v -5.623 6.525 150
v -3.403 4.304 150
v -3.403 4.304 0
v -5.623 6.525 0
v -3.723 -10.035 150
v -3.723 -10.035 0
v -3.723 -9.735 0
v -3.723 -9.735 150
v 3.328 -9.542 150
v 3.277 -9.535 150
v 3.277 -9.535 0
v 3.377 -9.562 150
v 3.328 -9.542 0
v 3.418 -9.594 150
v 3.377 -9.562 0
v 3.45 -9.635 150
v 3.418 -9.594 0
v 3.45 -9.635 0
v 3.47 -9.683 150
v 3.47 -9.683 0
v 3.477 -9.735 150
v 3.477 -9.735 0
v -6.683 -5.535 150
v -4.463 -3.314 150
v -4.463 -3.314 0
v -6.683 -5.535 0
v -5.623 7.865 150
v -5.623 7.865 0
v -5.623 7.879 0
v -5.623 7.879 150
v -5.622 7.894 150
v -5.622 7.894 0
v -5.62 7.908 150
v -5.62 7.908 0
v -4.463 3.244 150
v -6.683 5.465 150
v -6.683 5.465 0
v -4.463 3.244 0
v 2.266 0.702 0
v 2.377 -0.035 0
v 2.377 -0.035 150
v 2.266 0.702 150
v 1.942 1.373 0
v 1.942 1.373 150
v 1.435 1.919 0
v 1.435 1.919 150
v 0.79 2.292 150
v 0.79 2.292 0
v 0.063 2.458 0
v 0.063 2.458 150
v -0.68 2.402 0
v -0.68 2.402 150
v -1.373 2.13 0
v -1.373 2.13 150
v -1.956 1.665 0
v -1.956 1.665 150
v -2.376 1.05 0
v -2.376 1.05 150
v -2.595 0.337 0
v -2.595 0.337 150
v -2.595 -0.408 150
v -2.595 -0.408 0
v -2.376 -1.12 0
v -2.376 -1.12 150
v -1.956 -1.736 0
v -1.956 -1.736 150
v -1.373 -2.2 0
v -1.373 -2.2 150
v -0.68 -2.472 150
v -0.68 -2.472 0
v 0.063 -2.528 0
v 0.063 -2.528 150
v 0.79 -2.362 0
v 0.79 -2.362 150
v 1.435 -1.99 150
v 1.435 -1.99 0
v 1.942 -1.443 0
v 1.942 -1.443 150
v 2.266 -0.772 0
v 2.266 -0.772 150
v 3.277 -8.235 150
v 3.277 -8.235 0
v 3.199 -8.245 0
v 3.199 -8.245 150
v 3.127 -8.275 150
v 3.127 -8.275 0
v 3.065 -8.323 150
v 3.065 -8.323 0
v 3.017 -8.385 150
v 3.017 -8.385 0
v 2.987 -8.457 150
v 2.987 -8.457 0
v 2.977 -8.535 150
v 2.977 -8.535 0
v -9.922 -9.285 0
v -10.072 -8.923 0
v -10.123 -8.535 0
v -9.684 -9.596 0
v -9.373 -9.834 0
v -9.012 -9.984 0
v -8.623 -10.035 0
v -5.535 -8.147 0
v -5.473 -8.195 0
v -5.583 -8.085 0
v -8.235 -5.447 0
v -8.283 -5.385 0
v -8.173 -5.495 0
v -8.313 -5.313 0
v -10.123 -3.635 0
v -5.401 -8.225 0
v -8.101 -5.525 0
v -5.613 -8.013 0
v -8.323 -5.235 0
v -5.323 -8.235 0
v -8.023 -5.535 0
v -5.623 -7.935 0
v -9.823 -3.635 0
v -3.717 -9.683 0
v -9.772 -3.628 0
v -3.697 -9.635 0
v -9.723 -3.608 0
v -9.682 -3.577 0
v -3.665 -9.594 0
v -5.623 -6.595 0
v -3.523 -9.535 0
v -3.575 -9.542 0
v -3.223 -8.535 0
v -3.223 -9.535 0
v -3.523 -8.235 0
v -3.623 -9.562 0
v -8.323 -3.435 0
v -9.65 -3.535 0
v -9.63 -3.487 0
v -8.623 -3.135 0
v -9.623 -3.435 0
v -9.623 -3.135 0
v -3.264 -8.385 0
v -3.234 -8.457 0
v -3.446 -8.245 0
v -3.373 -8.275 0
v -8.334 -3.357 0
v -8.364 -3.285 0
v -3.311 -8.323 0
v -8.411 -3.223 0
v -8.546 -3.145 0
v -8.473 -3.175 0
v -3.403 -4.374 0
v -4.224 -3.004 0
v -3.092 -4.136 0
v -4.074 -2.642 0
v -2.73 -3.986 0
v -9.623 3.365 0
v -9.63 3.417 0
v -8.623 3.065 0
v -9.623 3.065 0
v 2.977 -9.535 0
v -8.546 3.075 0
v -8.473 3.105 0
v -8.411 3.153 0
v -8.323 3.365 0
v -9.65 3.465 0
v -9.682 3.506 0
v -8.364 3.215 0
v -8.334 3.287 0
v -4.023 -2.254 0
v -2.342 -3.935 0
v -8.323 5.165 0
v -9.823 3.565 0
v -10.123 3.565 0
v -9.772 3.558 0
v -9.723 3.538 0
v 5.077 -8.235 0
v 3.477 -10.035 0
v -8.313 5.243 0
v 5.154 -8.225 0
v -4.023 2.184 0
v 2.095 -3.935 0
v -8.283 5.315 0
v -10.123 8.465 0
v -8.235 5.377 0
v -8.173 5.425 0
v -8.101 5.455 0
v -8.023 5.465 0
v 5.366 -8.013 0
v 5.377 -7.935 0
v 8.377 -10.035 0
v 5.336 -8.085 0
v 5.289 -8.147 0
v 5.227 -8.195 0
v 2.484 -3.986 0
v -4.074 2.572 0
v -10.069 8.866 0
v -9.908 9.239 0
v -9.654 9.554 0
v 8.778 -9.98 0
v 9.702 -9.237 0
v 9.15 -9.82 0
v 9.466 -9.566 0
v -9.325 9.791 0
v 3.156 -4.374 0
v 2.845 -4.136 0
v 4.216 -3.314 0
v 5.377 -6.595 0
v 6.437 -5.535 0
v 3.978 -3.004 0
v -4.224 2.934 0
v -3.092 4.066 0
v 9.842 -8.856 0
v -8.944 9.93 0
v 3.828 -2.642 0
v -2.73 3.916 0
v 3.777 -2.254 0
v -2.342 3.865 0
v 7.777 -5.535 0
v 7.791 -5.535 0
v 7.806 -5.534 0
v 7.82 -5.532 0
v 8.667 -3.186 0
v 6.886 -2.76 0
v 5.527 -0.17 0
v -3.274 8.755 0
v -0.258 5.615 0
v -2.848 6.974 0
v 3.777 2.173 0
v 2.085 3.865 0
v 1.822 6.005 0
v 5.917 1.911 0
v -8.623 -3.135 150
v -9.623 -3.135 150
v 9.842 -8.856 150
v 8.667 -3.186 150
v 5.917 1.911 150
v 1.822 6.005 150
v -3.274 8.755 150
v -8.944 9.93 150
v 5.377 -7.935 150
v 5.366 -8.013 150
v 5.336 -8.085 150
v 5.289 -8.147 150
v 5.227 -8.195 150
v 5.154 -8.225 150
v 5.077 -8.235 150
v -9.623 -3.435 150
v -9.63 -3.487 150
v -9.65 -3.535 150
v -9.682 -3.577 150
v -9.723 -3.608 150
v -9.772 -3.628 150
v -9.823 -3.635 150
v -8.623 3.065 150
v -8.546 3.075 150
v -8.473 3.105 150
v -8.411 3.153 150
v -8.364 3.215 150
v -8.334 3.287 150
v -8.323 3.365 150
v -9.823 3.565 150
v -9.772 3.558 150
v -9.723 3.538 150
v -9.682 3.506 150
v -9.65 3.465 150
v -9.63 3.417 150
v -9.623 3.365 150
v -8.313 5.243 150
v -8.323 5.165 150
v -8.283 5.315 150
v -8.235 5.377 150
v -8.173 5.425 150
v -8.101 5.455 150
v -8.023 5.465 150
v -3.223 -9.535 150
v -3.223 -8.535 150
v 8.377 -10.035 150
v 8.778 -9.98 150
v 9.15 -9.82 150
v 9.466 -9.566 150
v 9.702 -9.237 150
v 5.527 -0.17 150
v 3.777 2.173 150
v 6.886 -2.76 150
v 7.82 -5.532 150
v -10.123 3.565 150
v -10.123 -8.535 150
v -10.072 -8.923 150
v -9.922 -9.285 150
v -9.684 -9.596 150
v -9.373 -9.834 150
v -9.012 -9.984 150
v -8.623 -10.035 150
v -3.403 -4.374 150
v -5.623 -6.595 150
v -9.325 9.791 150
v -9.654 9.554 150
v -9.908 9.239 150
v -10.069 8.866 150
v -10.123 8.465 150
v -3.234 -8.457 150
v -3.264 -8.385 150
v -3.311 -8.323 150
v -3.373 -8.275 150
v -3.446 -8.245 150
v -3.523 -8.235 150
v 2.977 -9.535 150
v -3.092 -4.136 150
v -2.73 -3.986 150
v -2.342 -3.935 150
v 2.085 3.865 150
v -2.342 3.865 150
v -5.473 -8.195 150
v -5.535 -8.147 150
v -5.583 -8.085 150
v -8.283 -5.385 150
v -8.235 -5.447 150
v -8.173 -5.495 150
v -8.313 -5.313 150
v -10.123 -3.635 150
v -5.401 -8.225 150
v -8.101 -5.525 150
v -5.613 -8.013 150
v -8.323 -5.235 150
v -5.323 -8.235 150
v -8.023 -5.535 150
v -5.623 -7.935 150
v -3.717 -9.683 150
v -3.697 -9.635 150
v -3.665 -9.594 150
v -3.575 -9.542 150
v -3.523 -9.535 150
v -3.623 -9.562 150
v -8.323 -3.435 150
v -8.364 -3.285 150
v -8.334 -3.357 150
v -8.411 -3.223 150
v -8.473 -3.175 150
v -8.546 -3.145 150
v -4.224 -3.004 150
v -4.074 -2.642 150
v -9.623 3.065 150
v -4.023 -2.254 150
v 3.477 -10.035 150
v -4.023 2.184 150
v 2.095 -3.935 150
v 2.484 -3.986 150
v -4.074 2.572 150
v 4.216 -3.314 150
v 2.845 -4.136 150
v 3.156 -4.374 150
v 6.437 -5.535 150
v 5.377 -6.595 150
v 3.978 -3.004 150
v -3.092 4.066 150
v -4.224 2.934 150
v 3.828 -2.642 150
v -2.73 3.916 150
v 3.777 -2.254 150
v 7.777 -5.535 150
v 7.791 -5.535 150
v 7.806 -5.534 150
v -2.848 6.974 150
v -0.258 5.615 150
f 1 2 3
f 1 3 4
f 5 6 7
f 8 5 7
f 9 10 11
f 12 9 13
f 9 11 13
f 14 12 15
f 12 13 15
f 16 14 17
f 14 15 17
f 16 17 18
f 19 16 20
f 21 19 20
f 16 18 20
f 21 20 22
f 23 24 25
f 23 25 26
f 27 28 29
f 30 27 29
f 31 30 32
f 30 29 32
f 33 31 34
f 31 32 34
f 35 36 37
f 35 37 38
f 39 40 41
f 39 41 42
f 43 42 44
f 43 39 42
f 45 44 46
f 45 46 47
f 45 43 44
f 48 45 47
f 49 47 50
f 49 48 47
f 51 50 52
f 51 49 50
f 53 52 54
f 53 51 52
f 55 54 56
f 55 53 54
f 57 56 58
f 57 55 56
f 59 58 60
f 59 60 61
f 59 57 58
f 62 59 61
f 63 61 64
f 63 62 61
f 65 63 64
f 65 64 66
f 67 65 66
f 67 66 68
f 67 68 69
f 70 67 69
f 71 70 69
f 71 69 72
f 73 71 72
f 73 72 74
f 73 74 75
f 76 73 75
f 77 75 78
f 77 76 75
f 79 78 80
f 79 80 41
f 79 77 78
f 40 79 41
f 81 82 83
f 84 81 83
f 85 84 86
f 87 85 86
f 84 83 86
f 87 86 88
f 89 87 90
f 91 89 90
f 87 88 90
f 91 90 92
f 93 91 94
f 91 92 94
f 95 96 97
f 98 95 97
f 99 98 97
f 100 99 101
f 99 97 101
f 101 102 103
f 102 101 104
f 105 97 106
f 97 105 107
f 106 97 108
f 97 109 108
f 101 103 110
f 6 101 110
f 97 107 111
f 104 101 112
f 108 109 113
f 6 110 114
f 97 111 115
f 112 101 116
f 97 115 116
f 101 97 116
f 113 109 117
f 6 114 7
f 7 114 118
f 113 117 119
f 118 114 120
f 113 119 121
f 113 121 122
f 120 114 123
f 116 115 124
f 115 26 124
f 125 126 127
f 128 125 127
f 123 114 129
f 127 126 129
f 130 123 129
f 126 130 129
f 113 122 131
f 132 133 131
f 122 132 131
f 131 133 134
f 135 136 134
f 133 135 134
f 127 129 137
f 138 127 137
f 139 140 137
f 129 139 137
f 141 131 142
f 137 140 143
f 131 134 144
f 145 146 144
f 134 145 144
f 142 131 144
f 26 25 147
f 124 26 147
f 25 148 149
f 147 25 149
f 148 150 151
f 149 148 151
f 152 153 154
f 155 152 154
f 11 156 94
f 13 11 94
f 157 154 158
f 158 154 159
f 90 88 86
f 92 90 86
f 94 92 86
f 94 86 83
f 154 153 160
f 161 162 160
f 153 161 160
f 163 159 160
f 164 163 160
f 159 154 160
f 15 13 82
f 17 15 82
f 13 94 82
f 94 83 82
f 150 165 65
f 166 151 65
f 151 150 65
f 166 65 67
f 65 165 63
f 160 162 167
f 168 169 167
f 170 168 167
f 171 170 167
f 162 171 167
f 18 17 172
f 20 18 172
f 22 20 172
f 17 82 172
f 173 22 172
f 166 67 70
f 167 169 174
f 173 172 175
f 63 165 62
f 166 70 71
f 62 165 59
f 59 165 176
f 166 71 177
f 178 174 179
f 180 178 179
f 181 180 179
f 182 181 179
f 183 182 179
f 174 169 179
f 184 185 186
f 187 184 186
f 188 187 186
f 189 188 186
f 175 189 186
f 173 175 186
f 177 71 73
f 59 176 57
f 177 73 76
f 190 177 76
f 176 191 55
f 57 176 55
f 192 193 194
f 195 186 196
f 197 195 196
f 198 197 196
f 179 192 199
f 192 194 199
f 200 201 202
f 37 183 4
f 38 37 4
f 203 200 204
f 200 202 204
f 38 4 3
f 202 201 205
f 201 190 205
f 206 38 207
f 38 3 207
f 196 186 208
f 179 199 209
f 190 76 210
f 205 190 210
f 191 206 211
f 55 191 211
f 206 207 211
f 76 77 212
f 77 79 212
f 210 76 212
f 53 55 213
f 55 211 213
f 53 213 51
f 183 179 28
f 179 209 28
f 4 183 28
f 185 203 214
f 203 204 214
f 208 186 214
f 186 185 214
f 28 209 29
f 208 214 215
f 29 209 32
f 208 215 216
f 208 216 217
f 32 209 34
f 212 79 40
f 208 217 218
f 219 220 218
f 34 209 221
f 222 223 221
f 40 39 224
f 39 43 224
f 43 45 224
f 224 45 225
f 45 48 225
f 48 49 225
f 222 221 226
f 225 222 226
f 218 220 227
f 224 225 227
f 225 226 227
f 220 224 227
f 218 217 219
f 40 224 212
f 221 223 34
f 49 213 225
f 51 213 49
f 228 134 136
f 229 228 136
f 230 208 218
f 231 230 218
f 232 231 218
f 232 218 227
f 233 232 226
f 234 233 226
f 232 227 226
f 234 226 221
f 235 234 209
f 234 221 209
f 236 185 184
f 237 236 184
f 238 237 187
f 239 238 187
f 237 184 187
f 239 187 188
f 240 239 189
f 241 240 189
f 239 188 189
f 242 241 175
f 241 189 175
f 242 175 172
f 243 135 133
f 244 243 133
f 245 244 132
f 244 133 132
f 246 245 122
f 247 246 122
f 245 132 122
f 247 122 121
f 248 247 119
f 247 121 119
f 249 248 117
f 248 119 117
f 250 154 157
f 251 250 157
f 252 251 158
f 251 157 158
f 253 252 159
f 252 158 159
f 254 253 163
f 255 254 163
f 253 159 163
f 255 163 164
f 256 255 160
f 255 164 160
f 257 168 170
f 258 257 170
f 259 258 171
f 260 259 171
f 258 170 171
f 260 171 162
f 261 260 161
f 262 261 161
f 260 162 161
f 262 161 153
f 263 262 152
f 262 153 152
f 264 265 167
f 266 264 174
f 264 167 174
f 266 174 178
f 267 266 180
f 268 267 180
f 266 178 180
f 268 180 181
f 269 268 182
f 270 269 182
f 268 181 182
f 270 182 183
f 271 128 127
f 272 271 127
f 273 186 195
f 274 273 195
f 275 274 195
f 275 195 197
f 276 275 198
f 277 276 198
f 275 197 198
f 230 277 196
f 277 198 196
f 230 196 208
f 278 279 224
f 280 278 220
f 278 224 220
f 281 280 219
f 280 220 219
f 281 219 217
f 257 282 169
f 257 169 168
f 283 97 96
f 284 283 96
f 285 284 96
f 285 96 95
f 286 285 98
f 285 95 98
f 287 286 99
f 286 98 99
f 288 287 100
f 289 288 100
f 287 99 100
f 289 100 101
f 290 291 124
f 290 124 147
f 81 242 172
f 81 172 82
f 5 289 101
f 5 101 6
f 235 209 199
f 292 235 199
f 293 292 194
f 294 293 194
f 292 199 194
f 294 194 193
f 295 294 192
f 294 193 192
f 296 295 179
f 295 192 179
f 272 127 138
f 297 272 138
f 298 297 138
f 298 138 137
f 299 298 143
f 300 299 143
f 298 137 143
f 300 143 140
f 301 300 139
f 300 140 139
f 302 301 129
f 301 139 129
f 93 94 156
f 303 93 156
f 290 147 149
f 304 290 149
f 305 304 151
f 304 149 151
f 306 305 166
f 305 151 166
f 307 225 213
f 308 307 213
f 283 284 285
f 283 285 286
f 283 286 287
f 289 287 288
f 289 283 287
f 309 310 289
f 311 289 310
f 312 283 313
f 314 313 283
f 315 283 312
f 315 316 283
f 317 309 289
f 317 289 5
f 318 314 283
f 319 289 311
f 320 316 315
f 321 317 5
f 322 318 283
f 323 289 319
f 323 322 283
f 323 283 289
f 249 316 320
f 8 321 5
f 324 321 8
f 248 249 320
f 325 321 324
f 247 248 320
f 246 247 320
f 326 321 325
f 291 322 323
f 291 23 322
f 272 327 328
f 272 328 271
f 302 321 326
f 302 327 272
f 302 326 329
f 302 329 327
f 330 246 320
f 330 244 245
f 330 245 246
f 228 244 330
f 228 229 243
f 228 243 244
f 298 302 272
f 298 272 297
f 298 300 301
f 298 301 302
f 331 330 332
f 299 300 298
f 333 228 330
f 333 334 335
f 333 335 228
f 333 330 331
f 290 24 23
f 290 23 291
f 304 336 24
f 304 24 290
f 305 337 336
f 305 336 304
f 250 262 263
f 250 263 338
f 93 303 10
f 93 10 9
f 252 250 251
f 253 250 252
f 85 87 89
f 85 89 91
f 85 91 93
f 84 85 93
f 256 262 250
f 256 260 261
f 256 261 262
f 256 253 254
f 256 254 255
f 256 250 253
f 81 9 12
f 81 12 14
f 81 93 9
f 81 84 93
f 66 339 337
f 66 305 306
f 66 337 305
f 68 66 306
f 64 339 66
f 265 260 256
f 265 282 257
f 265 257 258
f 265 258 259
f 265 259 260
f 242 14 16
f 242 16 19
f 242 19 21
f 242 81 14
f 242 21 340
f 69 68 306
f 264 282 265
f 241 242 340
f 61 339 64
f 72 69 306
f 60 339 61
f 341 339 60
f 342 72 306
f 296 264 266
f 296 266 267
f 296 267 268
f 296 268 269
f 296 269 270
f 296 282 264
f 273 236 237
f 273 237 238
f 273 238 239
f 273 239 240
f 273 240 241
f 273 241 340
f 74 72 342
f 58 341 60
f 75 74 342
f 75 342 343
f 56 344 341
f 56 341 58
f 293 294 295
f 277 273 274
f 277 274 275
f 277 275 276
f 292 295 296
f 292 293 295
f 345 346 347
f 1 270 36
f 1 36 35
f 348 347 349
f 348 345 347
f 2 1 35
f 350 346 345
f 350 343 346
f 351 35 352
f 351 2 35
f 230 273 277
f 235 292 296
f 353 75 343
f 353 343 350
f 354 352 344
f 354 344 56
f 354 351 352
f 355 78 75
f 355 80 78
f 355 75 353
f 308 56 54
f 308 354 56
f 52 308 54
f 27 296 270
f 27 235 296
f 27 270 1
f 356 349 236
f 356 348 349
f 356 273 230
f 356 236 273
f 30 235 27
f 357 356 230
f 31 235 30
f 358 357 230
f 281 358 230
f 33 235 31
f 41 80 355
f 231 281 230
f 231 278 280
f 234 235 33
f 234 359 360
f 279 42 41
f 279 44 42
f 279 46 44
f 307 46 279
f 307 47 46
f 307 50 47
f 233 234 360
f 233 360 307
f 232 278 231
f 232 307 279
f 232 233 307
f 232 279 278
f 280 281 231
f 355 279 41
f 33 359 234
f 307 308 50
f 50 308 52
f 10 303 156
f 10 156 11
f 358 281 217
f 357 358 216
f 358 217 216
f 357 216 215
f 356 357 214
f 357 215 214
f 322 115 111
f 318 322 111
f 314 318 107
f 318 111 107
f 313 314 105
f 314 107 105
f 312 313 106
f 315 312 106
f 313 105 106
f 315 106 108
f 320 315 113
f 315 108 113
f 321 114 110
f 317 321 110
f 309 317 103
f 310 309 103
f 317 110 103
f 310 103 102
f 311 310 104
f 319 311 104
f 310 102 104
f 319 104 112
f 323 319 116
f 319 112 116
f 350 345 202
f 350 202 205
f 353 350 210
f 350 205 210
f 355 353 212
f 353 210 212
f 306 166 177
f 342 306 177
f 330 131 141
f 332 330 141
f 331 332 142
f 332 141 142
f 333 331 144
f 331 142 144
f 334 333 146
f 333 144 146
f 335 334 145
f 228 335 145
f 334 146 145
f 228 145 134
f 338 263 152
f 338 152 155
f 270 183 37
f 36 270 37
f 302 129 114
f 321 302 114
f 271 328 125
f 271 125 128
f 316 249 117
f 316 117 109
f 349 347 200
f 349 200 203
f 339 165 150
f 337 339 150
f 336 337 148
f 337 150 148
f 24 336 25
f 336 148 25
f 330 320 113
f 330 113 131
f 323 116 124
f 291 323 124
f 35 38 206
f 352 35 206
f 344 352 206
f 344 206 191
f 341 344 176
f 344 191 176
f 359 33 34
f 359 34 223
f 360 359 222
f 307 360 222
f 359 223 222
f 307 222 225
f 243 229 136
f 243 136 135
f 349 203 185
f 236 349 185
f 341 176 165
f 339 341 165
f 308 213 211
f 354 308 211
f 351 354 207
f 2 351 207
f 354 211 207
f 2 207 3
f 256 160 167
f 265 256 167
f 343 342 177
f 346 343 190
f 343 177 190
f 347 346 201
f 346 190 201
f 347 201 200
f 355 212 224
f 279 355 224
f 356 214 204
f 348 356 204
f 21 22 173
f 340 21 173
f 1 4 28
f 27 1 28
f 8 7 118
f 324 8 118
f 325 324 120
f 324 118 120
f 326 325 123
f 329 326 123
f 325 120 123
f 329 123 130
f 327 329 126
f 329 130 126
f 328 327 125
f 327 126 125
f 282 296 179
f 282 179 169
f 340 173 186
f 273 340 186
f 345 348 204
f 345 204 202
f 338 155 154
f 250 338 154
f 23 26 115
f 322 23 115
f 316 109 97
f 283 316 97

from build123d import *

# Parameters (mm, degrees)
SKETCH_1_R      = 2.5
EXTRUDE_1_DEPTH = 150


with BuildPart() as part:
    # 草图1 → 凸台-拉伸1 (new body)
    with BuildSketch(Plane.XY):
        with BuildLine():
            ThreePointArc((-8.944458369, 9.930115847), (-9.792033903, 9.405190523), (-10.123344197, 8.464890373))
            Line((-10.123344197, 8.464890373), (-10.123344197, 3.564890373))
            Line((-10.123344197, 3.564890373), (-9.823344197, 3.564890373))
            ThreePointArc((-9.823344197, 3.564890373), (-9.681922841, 3.50631173), (-9.623344197, 3.364890373))
            Line((-9.623344197, 3.364890373), (-9.623344197, 3.064890373))
            Line((-9.623344197, 3.064890373), (-8.623344197, 3.064890373))
            ThreePointArc((-8.623344197, 3.064890373), (-8.411212162, 3.152758339), (-8.323344197, 3.364890373))
            Line((-8.323344197, 3.364890373), (-8.323344197, 5.164890373))
            ThreePointArc((-8.323344197, 5.164890373), (-8.235476231, 5.377022408), (-8.023344197, 5.464890373))
            Line((-8.023344197, 5.464890373), (-6.683344197, 5.464890373))
            Line((-6.683344197, 5.464890373), (-4.462684025, 3.244230202))
            ThreePointArc((-4.462684025, 3.244230202), (-4.137524898, 2.757595178), (-4.023344197, 2.18357003))
            Line((-4.023344197, 2.18357003), (-4.023344197, -2.253789283))
            ThreePointArc((-4.023344197, -2.253789283), (-4.137524898, -2.827814432), (-4.462684025, -3.314449455))
            Line((-4.462684025, -3.314449455), (-6.683344197, -5.535109627))
            Line((-6.683344197, -5.535109627), (-8.023344197, -5.535109627))
            ThreePointArc((-8.023344197, -5.535109627), (-8.235476231, -5.447241661), (-8.323344197, -5.235109627))
            Line((-8.323344197, -5.235109627), (-8.323344197, -3.435109627))
            ThreePointArc((-8.323344197, -3.435109627), (-8.411212162, -3.222977592), (-8.623344197, -3.135109627))
            Line((-8.623344197, -3.135109627), (-9.623344197, -3.135109627))
            Line((-9.623344197, -3.135109627), (-9.623344197, -3.435109627))
            ThreePointArc((-9.623344197, -3.435109627), (-9.681922841, -3.576530983), (-9.823344197, -3.635109627))
            Line((-9.823344197, -3.635109627), (-10.123344197, -3.635109627))
            Line((-10.123344197, -3.635109627), (-10.123344197, -8.535109627))
            ThreePointArc((-10.123344197, -8.535109627), (-9.684004369, -9.595769798), (-8.623344197, -10.035109627))
            Line((-8.623344197, -10.035109627), (-3.723344197, -10.035109627))
            Line((-3.723344197, -10.035109627), (-3.723344197, -9.735109627))
            ThreePointArc((-3.723344197, -9.735109627), (-3.664765553, -9.59368827), (-3.523344197, -9.535109627))
            Line((-3.523344197, -9.535109627), (-3.223344197, -9.535109627))
            Line((-3.223344197, -9.535109627), (-3.223344197, -8.535109627))
            ThreePointArc((-3.223344197, -8.535109627), (-3.311212162, -8.322977592), (-3.523344197, -8.235109627))
            Line((-3.523344197, -8.235109627), (-5.323344197, -8.235109627))
            ThreePointArc((-5.323344197, -8.235109627), (-5.535476231, -8.147241661), (-5.623344197, -7.935109627))
            Line((-5.623344197, -7.935109627), (-5.623344197, -6.595109627))
            Line((-5.623344197, -6.595109627), (-3.402684025, -4.374449455))
            ThreePointArc((-3.402684025, -4.374449455), (-2.916049002, -4.049290328), (-2.342023853, -3.935109627))
            Line((-2.342023853, -3.935109627), (2.09533546, -3.935109627))
            ThreePointArc((2.09533546, -3.935109627), (2.669360608, -4.049290328), (3.155995631, -4.374449455))
            Line((3.155995631, -4.374449455), (5.376655803, -6.595109627))
            Line((5.376655803, -6.595109627), (5.376655803, -7.935109627))
            ThreePointArc((5.376655803, -7.935109627), (5.288787838, -8.147241661), (5.076655803, -8.235109627))
            Line((5.076655803, -8.235109627), (3.276655803, -8.235109627))
            ThreePointArc((3.276655803, -8.235109627), (3.064523769, -8.322977592), (2.976655803, -8.535109627))
            Line((2.976655803, -8.535109627), (2.976655803, -9.535109627))
            Line((2.976655803, -9.535109627), (3.276655803, -9.535109627))
            ThreePointArc((3.276655803, -9.535109627), (3.418077159, -9.59368827), (3.476655803, -9.735109627))
            Line((3.476655803, -9.735109627), (3.476655803, -10.035109627))
            Line((3.476655803, -10.035109627), (8.376655803, -10.035109627))
            ThreePointArc((8.376655803, -10.035109627), (9.316955952, -9.703799333), (9.841881277, -8.856223799))
            ThreePointArc((9.841881277, -8.856223799), (4.018791427, 4.107025997), (-8.944458369, 9.930115847))
        make_face()
        with BuildLine():
            ThreePointArc((7.820216628, -5.531930203), (7.798494154, -5.534313715), (7.776655803, -5.535109627))
            Line((7.776655803, -5.535109627), (6.436655803, -5.535109627))
            Line((6.436655803, -5.535109627), (4.215995631, -3.314449455))
            ThreePointArc((4.215995631, -3.314449455), (3.890836504, -2.827814432), (3.776655803, -2.253789283))
            Line((3.776655803, -2.253789283), (3.776655803, 2.173084343))
            ThreePointArc((3.776655803, 2.173084343), (6.257892136, -1.4383023), (7.820216628, -5.531930203))
        make_face(mode=Mode.SUBTRACT)
        with BuildLine():
            ThreePointArc((-5.620164773, 7.908451198), (-1.52653687, 6.346126706), (2.084849773, 3.864890373))
            Line((2.084849773, 3.864890373), (-2.342023853, 3.864890373))
            ThreePointArc((-2.342023853, 3.864890373), (-2.916049002, 3.979071075), (-3.402684025, 4.304230202))
            Line((-3.402684025, 4.304230202), (-5.623344197, 6.524890373))
            Line((-5.623344197, 6.524890373), (-5.623344197, 7.864890373))
            ThreePointArc((-5.623344197, 7.864890373), (-5.622548285, 7.886728724), (-5.620164773, 7.908451198))
        make_face(mode=Mode.SUBTRACT)
        with Locations((-0.123344197, -0.035109627)):
            Circle(SKETCH_1_R, mode=Mode.SUBTRACT)
    extrude(amount=EXTRUDE_1_DEPTH)


solid = part.part
